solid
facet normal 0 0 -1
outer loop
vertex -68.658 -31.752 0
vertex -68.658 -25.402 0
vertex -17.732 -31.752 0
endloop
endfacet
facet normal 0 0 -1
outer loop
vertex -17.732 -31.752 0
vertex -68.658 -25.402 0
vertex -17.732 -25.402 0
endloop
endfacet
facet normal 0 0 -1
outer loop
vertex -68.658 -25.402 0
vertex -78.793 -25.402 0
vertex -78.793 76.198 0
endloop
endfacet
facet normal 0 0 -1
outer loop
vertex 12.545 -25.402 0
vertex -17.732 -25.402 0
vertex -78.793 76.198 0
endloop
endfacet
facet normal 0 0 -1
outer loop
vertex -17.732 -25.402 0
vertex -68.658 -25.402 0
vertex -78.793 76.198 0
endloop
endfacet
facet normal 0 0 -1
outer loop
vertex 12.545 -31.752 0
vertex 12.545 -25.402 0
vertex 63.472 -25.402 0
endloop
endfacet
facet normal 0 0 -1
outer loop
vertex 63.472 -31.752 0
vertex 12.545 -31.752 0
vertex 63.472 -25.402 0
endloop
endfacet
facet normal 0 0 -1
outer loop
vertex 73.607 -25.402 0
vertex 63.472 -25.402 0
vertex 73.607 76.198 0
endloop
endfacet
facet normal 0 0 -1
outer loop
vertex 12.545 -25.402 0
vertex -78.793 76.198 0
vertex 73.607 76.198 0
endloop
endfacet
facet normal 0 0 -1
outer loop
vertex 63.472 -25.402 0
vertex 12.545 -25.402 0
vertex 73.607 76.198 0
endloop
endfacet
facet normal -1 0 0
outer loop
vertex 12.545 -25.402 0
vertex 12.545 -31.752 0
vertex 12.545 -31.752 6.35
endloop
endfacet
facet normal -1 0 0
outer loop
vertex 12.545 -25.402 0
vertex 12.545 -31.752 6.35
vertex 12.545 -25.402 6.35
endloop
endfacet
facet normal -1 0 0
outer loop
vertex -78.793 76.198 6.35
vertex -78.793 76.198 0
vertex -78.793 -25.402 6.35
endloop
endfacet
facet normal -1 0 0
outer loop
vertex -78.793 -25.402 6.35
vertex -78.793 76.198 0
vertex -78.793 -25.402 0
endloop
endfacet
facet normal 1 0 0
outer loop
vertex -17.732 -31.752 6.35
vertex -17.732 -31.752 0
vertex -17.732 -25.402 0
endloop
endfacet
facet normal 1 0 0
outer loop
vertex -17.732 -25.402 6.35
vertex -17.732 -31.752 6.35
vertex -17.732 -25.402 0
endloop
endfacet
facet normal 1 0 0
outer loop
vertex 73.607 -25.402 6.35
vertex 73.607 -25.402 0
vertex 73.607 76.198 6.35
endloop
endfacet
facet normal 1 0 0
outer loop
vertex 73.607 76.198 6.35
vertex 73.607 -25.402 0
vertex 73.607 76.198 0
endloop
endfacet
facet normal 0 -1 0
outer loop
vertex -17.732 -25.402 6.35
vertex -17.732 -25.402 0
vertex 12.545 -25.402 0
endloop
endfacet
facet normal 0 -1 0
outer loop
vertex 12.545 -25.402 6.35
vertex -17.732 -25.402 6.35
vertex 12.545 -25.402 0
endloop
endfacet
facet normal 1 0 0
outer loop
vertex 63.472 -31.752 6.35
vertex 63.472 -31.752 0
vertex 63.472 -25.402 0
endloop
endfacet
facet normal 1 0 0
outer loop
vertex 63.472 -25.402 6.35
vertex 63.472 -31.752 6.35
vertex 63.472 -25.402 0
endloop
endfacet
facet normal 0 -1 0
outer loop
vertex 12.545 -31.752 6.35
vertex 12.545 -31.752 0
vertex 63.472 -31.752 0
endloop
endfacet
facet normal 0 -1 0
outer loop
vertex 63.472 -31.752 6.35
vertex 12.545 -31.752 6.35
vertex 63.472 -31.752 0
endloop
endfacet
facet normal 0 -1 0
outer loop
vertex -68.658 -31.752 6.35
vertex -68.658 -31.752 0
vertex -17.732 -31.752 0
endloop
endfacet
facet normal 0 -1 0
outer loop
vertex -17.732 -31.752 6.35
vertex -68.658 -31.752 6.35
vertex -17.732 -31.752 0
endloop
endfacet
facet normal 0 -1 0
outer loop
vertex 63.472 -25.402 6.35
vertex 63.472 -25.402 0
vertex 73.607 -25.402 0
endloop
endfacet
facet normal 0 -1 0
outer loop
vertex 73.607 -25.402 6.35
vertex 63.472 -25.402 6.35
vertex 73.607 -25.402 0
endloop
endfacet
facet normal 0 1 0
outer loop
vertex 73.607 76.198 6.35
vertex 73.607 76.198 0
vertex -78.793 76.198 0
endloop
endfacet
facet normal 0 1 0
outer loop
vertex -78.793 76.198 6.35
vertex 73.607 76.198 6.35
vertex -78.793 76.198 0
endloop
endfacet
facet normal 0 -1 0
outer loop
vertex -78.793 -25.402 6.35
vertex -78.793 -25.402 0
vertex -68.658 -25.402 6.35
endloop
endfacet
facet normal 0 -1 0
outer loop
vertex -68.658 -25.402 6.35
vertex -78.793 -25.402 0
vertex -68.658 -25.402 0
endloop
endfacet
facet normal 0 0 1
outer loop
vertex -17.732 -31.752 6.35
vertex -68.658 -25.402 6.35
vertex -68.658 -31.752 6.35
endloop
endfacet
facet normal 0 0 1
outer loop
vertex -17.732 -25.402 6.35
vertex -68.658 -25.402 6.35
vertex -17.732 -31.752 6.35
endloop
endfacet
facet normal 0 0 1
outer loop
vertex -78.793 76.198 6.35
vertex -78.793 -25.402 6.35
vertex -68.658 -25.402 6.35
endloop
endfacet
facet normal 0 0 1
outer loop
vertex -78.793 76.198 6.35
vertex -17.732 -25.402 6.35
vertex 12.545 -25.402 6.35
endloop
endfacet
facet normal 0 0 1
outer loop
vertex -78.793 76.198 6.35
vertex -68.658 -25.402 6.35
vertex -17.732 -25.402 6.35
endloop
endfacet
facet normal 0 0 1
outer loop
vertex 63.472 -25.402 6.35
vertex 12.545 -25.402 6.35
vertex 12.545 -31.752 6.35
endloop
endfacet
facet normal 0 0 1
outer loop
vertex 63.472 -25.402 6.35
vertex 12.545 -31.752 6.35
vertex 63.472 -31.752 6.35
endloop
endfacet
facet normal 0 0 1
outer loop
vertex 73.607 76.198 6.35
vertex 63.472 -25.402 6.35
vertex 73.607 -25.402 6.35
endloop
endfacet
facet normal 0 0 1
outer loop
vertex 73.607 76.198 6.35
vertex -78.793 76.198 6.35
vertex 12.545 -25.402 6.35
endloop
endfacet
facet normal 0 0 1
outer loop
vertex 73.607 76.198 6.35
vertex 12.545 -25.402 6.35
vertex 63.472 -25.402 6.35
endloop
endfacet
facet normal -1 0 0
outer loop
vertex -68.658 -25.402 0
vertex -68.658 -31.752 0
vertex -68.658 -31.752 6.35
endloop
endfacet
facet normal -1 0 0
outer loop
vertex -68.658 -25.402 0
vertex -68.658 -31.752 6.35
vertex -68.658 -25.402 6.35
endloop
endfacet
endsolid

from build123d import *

# Parameters (mm, degrees)
SKETCH1_W           = 50.926738498
SKETCH1_H           = 6.35
SKETCH1_W_2         = 50.926738497
BOSS_EXTRUDE1_DEPTH = 6.35


with BuildPart() as part:
    # Sketch1 → Boss-Extrude1 (new body)
    with BuildSketch(Plane.XY):
        Polygon((-2.593337475, -25.401893638), (-2.593337475, 76.198106362), (-78.793337475, 76.198106362), (-78.793337475, -25.401893638), (-68.658315464, -25.401893638), (-17.731576967, -25.401893638), align=None)
        Polygon((73.606662525, 76.198106362), (-2.593337475, 76.198106362), (-2.593337475, -25.401893638), (12.544902016, -25.401893638), (63.471640514, -25.401893638), (73.606662525, -25.401893638), align=None)
        with Locations((38.008271265, -28.576893638)):
            Rectangle(SKETCH1_W, SKETCH1_H)
        with Locations((-43.194946215, -28.576893638)):
            Rectangle(SKETCH1_W_2, SKETCH1_H)
    extrude(amount=BOSS_EXTRUDE1_DEPTH)


solid = part.part
